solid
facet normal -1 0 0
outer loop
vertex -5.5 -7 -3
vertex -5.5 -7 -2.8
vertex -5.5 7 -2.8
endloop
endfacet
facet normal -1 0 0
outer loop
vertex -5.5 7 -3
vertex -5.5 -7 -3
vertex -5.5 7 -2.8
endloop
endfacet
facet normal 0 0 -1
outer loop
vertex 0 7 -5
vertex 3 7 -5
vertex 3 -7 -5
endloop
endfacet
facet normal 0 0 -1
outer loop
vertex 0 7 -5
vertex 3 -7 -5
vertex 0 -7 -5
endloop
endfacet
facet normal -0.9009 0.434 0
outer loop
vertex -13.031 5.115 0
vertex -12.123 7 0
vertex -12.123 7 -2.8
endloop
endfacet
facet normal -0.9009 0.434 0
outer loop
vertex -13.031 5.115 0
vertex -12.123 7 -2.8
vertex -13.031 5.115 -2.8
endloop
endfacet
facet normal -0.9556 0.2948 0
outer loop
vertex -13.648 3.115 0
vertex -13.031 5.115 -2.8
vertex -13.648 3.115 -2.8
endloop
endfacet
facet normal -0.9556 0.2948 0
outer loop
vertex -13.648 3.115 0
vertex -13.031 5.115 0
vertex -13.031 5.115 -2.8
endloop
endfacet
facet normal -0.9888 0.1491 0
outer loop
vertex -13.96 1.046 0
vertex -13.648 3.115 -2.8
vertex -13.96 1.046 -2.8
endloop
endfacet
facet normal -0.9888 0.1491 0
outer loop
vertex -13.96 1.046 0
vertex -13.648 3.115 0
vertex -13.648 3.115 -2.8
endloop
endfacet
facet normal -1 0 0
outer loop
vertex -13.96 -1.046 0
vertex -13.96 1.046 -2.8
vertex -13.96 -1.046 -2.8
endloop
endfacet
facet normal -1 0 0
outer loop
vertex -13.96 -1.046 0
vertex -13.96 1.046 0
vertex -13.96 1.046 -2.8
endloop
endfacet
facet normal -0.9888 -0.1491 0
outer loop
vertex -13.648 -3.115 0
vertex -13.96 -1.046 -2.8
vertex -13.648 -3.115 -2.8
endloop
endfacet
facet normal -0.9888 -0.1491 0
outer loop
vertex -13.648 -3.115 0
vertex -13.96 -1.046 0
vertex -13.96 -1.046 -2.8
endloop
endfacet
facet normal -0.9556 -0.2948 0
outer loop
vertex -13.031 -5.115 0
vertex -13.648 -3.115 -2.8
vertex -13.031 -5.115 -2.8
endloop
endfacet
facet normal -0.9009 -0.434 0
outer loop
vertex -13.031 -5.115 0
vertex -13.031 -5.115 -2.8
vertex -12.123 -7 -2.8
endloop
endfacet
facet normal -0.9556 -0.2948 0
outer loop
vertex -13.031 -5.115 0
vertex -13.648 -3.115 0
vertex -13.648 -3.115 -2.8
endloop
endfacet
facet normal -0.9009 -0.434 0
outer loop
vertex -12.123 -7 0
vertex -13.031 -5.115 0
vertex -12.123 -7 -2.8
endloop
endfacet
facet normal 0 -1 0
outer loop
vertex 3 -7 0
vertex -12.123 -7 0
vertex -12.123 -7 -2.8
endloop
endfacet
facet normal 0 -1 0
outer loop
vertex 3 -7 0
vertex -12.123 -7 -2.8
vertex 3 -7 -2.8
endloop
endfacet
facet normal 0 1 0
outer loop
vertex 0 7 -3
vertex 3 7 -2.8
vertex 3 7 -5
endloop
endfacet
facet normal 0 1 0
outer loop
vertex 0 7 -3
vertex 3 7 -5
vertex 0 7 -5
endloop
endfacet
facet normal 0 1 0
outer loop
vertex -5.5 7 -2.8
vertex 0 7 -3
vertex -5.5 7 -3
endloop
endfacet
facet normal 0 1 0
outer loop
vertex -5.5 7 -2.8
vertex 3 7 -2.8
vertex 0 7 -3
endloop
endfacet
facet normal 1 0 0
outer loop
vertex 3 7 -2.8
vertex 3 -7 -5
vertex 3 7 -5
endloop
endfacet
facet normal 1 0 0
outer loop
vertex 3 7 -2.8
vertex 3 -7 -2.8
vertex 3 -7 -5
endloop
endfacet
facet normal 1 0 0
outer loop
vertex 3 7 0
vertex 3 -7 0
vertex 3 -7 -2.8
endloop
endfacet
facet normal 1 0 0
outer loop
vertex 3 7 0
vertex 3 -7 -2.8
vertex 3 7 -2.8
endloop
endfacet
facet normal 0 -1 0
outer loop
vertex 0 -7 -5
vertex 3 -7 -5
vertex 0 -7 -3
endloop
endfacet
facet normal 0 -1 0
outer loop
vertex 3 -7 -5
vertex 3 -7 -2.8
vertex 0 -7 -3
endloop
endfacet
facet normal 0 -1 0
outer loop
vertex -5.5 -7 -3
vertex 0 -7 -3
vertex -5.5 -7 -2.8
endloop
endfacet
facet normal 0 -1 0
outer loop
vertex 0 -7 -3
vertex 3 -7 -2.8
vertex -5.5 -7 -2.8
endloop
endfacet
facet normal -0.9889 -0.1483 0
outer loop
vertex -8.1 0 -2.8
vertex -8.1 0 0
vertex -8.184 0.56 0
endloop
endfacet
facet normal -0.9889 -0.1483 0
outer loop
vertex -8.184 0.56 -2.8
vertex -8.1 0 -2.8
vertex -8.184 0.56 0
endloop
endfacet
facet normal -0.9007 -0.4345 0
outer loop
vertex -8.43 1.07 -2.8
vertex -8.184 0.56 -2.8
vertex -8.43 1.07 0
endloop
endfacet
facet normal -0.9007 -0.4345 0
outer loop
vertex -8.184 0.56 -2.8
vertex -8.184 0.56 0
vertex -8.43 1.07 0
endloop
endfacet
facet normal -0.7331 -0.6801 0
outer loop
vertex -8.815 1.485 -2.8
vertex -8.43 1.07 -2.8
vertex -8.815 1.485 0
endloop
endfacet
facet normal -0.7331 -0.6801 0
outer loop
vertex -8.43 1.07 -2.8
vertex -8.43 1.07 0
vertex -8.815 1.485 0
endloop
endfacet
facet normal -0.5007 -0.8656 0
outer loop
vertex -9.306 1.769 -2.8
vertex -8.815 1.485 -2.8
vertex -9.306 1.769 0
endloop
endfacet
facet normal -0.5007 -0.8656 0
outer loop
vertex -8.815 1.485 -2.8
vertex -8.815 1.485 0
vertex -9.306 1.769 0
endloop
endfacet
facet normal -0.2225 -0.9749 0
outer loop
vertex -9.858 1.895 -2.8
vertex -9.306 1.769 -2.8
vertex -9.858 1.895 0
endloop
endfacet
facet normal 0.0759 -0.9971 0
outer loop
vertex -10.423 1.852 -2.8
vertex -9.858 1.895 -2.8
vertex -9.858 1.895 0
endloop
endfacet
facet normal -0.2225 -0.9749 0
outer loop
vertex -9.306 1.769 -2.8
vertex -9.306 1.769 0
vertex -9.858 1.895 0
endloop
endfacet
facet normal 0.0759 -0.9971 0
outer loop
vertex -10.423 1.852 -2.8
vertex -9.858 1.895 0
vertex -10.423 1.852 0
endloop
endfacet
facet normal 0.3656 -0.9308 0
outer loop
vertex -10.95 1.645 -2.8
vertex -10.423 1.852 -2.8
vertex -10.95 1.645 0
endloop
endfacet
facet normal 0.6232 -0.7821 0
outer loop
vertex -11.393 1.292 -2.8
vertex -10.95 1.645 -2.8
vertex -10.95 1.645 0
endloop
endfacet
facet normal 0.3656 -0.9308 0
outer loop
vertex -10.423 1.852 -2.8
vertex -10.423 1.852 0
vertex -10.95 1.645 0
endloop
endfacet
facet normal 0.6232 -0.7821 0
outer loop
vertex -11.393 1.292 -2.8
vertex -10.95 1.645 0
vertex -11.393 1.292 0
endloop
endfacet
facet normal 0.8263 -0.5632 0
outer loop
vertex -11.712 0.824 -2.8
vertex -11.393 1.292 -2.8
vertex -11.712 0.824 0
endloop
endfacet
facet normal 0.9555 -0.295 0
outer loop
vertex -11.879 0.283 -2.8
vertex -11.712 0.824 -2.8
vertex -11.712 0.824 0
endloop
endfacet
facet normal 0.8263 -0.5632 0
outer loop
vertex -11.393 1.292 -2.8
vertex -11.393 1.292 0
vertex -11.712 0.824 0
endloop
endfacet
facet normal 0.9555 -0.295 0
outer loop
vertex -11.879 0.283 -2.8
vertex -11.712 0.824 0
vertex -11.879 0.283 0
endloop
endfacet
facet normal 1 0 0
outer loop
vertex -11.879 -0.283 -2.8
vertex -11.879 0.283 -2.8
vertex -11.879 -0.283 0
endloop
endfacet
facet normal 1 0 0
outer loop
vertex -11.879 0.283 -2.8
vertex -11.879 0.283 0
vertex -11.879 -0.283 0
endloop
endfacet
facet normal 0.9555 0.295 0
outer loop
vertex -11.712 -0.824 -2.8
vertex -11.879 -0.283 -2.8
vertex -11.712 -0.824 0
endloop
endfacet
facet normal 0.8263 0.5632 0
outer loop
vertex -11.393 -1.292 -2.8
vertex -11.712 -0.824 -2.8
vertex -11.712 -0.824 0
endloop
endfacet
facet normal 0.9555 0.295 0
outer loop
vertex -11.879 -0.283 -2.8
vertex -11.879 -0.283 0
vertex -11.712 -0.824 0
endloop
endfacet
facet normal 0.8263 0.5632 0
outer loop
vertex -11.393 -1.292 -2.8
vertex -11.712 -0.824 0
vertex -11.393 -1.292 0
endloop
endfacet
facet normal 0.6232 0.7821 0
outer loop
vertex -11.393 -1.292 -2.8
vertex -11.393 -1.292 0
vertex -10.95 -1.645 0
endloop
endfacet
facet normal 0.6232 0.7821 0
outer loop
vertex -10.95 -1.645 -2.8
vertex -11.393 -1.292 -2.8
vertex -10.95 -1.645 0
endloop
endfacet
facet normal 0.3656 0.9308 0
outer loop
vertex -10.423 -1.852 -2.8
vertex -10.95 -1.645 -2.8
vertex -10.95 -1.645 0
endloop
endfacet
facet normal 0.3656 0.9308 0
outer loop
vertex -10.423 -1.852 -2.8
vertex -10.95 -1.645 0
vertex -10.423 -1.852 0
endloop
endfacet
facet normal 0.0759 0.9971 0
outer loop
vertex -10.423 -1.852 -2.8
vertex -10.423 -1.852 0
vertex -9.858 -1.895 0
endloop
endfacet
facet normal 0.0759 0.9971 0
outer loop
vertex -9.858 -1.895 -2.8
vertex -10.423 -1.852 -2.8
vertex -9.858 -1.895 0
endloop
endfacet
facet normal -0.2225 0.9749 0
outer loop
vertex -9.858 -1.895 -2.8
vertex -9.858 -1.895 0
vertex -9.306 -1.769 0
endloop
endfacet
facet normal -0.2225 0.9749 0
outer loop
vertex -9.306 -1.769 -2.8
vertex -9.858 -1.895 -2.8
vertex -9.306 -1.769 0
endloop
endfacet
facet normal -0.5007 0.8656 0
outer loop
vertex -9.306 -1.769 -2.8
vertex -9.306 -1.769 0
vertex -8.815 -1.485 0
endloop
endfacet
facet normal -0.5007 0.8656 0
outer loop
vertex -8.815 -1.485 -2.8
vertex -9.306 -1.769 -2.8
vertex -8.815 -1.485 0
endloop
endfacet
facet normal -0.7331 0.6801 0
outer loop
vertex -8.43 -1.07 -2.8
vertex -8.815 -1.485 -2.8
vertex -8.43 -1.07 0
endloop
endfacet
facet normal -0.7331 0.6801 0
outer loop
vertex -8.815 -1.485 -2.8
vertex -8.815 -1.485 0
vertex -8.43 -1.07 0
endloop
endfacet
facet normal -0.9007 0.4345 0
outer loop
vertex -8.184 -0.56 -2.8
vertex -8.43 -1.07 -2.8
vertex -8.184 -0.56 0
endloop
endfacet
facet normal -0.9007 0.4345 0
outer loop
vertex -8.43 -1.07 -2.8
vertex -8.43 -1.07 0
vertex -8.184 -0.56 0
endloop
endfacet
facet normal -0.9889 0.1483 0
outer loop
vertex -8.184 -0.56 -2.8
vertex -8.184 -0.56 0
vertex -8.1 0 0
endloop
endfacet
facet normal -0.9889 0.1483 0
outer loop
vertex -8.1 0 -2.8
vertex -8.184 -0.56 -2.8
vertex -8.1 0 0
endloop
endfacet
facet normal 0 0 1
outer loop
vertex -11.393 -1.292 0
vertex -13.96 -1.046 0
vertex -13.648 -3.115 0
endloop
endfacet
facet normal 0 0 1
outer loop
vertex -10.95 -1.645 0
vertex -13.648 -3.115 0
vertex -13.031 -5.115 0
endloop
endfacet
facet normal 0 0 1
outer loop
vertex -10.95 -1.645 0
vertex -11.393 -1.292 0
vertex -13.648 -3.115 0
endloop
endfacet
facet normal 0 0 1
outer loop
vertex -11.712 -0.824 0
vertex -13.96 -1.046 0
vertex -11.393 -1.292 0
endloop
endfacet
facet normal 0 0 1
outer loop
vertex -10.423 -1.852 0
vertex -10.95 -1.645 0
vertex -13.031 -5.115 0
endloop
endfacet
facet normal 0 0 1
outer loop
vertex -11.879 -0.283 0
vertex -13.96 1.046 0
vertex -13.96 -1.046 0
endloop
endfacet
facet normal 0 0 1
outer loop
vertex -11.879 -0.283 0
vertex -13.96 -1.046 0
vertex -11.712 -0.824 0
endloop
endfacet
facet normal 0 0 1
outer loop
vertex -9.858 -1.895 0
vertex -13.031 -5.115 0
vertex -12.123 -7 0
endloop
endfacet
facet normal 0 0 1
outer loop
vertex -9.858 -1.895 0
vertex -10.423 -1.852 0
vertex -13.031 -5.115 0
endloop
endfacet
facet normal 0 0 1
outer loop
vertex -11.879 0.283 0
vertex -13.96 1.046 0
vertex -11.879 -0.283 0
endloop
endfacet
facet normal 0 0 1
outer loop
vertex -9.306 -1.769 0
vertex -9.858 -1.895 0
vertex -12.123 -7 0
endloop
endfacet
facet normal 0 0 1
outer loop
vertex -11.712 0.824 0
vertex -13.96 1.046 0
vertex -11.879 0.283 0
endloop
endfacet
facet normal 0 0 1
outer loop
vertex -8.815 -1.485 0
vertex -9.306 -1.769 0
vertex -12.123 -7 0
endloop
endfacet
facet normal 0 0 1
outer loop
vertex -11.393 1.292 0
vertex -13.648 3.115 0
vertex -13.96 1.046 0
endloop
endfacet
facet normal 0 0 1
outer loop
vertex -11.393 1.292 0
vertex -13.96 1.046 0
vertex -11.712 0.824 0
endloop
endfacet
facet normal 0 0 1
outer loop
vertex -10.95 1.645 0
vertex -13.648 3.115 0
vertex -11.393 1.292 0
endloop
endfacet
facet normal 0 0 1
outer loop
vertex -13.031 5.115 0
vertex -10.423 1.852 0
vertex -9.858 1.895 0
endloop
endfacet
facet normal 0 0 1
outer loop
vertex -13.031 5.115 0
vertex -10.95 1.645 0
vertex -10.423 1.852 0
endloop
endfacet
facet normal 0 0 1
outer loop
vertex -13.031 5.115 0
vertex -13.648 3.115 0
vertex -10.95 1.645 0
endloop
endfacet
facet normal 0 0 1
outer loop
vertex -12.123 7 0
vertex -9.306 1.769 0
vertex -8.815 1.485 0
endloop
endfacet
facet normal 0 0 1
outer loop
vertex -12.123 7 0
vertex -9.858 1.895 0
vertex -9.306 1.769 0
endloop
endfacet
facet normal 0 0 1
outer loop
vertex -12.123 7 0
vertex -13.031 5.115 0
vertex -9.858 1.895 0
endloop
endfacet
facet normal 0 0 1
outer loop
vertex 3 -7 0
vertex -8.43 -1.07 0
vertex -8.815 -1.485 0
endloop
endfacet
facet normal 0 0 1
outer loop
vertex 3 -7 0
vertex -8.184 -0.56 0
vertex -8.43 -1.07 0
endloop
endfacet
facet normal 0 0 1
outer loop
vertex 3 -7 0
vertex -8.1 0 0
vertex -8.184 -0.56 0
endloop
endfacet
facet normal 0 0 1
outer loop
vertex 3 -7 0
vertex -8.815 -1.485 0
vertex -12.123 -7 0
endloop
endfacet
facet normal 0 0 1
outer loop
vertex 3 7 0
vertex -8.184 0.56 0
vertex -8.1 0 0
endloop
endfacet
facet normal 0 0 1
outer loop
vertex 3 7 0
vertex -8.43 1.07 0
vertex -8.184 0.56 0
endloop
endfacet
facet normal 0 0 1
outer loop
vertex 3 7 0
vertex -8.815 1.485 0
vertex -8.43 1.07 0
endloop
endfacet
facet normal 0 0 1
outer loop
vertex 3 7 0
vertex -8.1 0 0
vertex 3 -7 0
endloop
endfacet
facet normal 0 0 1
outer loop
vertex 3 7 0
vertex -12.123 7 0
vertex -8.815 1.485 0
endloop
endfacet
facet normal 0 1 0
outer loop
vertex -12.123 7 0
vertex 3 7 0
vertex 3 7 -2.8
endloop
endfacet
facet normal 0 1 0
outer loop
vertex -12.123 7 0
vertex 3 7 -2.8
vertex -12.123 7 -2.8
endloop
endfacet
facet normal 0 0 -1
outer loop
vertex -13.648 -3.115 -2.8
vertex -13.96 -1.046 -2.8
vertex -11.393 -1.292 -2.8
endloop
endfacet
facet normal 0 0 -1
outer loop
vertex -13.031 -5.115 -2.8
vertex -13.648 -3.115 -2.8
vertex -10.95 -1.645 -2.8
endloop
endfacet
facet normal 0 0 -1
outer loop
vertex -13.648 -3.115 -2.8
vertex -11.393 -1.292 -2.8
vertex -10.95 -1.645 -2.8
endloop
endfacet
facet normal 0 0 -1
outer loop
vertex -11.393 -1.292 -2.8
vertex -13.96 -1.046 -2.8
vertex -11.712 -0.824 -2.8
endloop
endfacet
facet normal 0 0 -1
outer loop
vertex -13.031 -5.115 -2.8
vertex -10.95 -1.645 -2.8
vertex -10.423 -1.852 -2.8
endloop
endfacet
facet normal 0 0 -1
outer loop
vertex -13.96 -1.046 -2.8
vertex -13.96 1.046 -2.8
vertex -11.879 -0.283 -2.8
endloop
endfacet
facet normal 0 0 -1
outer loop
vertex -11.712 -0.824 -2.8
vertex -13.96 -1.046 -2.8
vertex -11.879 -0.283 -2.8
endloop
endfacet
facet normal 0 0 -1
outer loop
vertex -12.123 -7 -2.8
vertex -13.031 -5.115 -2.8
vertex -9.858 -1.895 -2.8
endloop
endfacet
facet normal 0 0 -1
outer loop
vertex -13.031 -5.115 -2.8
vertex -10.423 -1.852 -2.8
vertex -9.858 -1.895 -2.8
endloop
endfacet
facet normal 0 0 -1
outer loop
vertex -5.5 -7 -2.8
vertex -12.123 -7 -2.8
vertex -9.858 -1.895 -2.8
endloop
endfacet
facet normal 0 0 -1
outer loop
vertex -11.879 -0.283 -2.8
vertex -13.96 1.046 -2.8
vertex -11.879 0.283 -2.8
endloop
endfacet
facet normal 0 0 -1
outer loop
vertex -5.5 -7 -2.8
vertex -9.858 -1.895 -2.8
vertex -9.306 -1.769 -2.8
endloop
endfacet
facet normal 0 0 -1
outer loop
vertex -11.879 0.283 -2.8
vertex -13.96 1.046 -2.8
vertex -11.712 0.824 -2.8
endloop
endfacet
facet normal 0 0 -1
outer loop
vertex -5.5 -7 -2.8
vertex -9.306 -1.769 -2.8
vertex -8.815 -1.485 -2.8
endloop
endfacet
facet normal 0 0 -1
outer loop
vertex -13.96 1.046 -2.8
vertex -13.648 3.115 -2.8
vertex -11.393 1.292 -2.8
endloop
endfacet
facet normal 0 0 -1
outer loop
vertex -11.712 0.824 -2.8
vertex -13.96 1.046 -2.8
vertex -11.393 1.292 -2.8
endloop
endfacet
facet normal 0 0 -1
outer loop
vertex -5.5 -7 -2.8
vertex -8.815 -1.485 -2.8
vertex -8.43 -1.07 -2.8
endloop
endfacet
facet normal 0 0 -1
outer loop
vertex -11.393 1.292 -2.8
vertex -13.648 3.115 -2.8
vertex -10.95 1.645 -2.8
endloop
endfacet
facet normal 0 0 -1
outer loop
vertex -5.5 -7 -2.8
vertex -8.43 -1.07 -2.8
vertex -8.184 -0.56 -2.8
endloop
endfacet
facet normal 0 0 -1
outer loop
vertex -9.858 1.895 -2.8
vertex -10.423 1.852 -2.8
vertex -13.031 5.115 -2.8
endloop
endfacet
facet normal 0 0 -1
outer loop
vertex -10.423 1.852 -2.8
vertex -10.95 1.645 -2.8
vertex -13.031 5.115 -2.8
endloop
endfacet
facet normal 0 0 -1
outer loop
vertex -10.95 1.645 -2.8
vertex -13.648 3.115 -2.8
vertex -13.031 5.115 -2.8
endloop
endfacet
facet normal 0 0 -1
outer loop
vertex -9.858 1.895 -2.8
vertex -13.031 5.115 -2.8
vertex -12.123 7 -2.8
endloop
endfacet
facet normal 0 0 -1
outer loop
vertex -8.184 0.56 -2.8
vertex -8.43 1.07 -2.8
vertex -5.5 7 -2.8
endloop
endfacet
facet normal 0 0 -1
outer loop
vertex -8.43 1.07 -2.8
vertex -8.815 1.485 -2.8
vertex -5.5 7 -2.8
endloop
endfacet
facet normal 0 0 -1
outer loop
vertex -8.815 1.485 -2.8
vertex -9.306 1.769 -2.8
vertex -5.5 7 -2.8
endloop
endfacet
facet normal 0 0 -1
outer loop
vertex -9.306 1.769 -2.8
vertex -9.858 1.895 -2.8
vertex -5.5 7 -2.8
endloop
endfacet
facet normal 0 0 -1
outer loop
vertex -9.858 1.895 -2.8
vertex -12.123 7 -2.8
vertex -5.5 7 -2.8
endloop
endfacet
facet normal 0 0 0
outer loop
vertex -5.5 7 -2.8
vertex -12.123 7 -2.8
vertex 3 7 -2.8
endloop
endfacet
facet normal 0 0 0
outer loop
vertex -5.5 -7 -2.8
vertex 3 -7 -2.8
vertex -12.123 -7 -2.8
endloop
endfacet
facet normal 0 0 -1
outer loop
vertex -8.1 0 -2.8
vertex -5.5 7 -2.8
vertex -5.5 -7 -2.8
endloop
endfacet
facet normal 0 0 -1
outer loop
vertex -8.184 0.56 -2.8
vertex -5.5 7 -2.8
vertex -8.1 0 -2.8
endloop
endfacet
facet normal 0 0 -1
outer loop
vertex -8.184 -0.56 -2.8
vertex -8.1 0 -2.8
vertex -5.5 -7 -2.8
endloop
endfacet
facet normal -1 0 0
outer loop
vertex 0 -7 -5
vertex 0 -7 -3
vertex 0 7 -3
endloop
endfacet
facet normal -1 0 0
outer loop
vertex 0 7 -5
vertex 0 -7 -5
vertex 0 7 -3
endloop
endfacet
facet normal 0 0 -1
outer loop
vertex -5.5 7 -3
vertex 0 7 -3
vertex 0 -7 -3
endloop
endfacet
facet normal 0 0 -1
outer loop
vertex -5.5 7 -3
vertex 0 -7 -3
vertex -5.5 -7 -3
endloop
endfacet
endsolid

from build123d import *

# Parameters (mm, degrees)
SKETCH2_R           = 1.89991352
BOSS_EXTRUDE1_DEPTH = 2.8
SKETCH3_W           = 8.5
SKETCH3_H           = 14
BOSS_EXTRUDE2_DEPTH = 0.2
SKETCH4_W           = 3
SKETCH4_H           = 14
BOSS_EXTRUDE3_DEPTH = 2


with BuildPart() as part:
    # Sketch2 → Boss-Extrude1 (new body)
    with BuildSketch(Plane.XY):
        with BuildLine():
            Line((3, 7), (-12.123370128, 7.000155991))
            ThreePointArc((-12.123370128, 7.000155991), (-13.999397778, -1.288e-06), (-12.123378453, -7.000160797))
            Line((-12.123378453, -7.000160797), (3, -7))
            Line((3, -7), (3, 7))
        make_face()
        with Locations((-10.000000707, 1.18e-07)):
            Circle(SKETCH2_R, mode=Mode.SUBTRACT)
    extrude(amount=-BOSS_EXTRUDE1_DEPTH)

    # Sketch3 → Boss-Extrude2 (add)
    with BuildSketch(Plane(origin=(0, 0, -2.8), x_dir=(-1, 0, 0), z_dir=(0, 0, -1))):
        with Locations((1.25, 0)):
            Rectangle(SKETCH3_W, SKETCH3_H)
    extrude(amount=BOSS_EXTRUDE2_DEPTH)

    # Sketch4 → Boss-Extrude3 (add)
    with BuildSketch(Plane(origin=(0, 0, -3), x_dir=(-1, 0, 0), z_dir=(0, 0, -1))):
        with Locations((-1.5, 0)):
            Rectangle(SKETCH4_W, SKETCH4_H)
    extrude(amount=BOSS_EXTRUDE3_DEPTH)


solid = part.part
